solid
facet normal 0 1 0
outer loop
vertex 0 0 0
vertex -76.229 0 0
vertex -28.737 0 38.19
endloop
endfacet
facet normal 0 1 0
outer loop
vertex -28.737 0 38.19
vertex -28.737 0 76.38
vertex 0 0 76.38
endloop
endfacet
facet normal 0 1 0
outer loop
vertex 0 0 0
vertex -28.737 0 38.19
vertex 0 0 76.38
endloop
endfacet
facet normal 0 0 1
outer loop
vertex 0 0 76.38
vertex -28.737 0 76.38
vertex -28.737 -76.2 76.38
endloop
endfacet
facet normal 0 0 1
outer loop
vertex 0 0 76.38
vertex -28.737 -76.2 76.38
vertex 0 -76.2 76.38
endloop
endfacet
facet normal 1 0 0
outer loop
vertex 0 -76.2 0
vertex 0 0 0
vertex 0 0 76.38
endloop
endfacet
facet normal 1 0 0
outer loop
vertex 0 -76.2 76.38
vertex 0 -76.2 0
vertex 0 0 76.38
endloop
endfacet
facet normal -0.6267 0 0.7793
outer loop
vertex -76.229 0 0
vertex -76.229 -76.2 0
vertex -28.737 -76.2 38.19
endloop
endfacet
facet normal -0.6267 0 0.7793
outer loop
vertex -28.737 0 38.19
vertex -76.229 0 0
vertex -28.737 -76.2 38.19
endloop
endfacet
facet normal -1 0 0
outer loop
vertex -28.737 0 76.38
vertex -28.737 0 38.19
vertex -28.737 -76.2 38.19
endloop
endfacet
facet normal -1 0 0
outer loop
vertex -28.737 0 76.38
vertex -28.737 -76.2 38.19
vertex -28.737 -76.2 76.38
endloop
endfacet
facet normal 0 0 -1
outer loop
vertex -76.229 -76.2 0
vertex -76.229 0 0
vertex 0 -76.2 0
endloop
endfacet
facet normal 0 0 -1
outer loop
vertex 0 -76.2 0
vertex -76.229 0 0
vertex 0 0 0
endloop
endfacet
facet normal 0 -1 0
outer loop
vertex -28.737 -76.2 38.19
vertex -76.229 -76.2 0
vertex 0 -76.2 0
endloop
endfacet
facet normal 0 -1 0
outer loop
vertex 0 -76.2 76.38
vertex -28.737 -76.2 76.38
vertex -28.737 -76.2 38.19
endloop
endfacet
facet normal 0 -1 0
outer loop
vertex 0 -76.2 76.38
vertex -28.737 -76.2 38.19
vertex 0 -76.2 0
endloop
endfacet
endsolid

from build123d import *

# Parameters (mm, degrees)
F0_W     = 76.2288123369
F0_H     = 76.380059123
F1_DEPTH = 76.2
F2_W     = 47.4917609245
F2_H     = 38.1900295615
F3_DEPTH = 76.2
F5_DEPTH = 76.2


with BuildPart() as f1:
    # F0 (on Front) → F1 (new body)
    with BuildSketch(Plane.XZ):
        with Locations((-38.1144061685, 38.1900295615)):
            Rectangle(F0_W, F0_H)
    extrude(amount=F1_DEPTH)

    # F2 (on face) → F3 (cut)
    with BuildSketch(Plane.XZ.offset(76.2)):
        with Locations((-52.4829318747, 57.2850443423)):
            Rectangle(F2_W, F2_H)
    extrude(amount=-F3_DEPTH, mode=Mode.SUBTRACT)

    # F4 (on face) → F5 (cut)
    with BuildSketch(Plane.XZ.offset(76.2)):
        Polygon((-76.2288123369, 0), (-28.7370514125, 38.1900295615), (-76.2288123369, 38.1900295615), align=None)
    extrude(amount=-F5_DEPTH, mode=Mode.SUBTRACT)


solid = f1.part
